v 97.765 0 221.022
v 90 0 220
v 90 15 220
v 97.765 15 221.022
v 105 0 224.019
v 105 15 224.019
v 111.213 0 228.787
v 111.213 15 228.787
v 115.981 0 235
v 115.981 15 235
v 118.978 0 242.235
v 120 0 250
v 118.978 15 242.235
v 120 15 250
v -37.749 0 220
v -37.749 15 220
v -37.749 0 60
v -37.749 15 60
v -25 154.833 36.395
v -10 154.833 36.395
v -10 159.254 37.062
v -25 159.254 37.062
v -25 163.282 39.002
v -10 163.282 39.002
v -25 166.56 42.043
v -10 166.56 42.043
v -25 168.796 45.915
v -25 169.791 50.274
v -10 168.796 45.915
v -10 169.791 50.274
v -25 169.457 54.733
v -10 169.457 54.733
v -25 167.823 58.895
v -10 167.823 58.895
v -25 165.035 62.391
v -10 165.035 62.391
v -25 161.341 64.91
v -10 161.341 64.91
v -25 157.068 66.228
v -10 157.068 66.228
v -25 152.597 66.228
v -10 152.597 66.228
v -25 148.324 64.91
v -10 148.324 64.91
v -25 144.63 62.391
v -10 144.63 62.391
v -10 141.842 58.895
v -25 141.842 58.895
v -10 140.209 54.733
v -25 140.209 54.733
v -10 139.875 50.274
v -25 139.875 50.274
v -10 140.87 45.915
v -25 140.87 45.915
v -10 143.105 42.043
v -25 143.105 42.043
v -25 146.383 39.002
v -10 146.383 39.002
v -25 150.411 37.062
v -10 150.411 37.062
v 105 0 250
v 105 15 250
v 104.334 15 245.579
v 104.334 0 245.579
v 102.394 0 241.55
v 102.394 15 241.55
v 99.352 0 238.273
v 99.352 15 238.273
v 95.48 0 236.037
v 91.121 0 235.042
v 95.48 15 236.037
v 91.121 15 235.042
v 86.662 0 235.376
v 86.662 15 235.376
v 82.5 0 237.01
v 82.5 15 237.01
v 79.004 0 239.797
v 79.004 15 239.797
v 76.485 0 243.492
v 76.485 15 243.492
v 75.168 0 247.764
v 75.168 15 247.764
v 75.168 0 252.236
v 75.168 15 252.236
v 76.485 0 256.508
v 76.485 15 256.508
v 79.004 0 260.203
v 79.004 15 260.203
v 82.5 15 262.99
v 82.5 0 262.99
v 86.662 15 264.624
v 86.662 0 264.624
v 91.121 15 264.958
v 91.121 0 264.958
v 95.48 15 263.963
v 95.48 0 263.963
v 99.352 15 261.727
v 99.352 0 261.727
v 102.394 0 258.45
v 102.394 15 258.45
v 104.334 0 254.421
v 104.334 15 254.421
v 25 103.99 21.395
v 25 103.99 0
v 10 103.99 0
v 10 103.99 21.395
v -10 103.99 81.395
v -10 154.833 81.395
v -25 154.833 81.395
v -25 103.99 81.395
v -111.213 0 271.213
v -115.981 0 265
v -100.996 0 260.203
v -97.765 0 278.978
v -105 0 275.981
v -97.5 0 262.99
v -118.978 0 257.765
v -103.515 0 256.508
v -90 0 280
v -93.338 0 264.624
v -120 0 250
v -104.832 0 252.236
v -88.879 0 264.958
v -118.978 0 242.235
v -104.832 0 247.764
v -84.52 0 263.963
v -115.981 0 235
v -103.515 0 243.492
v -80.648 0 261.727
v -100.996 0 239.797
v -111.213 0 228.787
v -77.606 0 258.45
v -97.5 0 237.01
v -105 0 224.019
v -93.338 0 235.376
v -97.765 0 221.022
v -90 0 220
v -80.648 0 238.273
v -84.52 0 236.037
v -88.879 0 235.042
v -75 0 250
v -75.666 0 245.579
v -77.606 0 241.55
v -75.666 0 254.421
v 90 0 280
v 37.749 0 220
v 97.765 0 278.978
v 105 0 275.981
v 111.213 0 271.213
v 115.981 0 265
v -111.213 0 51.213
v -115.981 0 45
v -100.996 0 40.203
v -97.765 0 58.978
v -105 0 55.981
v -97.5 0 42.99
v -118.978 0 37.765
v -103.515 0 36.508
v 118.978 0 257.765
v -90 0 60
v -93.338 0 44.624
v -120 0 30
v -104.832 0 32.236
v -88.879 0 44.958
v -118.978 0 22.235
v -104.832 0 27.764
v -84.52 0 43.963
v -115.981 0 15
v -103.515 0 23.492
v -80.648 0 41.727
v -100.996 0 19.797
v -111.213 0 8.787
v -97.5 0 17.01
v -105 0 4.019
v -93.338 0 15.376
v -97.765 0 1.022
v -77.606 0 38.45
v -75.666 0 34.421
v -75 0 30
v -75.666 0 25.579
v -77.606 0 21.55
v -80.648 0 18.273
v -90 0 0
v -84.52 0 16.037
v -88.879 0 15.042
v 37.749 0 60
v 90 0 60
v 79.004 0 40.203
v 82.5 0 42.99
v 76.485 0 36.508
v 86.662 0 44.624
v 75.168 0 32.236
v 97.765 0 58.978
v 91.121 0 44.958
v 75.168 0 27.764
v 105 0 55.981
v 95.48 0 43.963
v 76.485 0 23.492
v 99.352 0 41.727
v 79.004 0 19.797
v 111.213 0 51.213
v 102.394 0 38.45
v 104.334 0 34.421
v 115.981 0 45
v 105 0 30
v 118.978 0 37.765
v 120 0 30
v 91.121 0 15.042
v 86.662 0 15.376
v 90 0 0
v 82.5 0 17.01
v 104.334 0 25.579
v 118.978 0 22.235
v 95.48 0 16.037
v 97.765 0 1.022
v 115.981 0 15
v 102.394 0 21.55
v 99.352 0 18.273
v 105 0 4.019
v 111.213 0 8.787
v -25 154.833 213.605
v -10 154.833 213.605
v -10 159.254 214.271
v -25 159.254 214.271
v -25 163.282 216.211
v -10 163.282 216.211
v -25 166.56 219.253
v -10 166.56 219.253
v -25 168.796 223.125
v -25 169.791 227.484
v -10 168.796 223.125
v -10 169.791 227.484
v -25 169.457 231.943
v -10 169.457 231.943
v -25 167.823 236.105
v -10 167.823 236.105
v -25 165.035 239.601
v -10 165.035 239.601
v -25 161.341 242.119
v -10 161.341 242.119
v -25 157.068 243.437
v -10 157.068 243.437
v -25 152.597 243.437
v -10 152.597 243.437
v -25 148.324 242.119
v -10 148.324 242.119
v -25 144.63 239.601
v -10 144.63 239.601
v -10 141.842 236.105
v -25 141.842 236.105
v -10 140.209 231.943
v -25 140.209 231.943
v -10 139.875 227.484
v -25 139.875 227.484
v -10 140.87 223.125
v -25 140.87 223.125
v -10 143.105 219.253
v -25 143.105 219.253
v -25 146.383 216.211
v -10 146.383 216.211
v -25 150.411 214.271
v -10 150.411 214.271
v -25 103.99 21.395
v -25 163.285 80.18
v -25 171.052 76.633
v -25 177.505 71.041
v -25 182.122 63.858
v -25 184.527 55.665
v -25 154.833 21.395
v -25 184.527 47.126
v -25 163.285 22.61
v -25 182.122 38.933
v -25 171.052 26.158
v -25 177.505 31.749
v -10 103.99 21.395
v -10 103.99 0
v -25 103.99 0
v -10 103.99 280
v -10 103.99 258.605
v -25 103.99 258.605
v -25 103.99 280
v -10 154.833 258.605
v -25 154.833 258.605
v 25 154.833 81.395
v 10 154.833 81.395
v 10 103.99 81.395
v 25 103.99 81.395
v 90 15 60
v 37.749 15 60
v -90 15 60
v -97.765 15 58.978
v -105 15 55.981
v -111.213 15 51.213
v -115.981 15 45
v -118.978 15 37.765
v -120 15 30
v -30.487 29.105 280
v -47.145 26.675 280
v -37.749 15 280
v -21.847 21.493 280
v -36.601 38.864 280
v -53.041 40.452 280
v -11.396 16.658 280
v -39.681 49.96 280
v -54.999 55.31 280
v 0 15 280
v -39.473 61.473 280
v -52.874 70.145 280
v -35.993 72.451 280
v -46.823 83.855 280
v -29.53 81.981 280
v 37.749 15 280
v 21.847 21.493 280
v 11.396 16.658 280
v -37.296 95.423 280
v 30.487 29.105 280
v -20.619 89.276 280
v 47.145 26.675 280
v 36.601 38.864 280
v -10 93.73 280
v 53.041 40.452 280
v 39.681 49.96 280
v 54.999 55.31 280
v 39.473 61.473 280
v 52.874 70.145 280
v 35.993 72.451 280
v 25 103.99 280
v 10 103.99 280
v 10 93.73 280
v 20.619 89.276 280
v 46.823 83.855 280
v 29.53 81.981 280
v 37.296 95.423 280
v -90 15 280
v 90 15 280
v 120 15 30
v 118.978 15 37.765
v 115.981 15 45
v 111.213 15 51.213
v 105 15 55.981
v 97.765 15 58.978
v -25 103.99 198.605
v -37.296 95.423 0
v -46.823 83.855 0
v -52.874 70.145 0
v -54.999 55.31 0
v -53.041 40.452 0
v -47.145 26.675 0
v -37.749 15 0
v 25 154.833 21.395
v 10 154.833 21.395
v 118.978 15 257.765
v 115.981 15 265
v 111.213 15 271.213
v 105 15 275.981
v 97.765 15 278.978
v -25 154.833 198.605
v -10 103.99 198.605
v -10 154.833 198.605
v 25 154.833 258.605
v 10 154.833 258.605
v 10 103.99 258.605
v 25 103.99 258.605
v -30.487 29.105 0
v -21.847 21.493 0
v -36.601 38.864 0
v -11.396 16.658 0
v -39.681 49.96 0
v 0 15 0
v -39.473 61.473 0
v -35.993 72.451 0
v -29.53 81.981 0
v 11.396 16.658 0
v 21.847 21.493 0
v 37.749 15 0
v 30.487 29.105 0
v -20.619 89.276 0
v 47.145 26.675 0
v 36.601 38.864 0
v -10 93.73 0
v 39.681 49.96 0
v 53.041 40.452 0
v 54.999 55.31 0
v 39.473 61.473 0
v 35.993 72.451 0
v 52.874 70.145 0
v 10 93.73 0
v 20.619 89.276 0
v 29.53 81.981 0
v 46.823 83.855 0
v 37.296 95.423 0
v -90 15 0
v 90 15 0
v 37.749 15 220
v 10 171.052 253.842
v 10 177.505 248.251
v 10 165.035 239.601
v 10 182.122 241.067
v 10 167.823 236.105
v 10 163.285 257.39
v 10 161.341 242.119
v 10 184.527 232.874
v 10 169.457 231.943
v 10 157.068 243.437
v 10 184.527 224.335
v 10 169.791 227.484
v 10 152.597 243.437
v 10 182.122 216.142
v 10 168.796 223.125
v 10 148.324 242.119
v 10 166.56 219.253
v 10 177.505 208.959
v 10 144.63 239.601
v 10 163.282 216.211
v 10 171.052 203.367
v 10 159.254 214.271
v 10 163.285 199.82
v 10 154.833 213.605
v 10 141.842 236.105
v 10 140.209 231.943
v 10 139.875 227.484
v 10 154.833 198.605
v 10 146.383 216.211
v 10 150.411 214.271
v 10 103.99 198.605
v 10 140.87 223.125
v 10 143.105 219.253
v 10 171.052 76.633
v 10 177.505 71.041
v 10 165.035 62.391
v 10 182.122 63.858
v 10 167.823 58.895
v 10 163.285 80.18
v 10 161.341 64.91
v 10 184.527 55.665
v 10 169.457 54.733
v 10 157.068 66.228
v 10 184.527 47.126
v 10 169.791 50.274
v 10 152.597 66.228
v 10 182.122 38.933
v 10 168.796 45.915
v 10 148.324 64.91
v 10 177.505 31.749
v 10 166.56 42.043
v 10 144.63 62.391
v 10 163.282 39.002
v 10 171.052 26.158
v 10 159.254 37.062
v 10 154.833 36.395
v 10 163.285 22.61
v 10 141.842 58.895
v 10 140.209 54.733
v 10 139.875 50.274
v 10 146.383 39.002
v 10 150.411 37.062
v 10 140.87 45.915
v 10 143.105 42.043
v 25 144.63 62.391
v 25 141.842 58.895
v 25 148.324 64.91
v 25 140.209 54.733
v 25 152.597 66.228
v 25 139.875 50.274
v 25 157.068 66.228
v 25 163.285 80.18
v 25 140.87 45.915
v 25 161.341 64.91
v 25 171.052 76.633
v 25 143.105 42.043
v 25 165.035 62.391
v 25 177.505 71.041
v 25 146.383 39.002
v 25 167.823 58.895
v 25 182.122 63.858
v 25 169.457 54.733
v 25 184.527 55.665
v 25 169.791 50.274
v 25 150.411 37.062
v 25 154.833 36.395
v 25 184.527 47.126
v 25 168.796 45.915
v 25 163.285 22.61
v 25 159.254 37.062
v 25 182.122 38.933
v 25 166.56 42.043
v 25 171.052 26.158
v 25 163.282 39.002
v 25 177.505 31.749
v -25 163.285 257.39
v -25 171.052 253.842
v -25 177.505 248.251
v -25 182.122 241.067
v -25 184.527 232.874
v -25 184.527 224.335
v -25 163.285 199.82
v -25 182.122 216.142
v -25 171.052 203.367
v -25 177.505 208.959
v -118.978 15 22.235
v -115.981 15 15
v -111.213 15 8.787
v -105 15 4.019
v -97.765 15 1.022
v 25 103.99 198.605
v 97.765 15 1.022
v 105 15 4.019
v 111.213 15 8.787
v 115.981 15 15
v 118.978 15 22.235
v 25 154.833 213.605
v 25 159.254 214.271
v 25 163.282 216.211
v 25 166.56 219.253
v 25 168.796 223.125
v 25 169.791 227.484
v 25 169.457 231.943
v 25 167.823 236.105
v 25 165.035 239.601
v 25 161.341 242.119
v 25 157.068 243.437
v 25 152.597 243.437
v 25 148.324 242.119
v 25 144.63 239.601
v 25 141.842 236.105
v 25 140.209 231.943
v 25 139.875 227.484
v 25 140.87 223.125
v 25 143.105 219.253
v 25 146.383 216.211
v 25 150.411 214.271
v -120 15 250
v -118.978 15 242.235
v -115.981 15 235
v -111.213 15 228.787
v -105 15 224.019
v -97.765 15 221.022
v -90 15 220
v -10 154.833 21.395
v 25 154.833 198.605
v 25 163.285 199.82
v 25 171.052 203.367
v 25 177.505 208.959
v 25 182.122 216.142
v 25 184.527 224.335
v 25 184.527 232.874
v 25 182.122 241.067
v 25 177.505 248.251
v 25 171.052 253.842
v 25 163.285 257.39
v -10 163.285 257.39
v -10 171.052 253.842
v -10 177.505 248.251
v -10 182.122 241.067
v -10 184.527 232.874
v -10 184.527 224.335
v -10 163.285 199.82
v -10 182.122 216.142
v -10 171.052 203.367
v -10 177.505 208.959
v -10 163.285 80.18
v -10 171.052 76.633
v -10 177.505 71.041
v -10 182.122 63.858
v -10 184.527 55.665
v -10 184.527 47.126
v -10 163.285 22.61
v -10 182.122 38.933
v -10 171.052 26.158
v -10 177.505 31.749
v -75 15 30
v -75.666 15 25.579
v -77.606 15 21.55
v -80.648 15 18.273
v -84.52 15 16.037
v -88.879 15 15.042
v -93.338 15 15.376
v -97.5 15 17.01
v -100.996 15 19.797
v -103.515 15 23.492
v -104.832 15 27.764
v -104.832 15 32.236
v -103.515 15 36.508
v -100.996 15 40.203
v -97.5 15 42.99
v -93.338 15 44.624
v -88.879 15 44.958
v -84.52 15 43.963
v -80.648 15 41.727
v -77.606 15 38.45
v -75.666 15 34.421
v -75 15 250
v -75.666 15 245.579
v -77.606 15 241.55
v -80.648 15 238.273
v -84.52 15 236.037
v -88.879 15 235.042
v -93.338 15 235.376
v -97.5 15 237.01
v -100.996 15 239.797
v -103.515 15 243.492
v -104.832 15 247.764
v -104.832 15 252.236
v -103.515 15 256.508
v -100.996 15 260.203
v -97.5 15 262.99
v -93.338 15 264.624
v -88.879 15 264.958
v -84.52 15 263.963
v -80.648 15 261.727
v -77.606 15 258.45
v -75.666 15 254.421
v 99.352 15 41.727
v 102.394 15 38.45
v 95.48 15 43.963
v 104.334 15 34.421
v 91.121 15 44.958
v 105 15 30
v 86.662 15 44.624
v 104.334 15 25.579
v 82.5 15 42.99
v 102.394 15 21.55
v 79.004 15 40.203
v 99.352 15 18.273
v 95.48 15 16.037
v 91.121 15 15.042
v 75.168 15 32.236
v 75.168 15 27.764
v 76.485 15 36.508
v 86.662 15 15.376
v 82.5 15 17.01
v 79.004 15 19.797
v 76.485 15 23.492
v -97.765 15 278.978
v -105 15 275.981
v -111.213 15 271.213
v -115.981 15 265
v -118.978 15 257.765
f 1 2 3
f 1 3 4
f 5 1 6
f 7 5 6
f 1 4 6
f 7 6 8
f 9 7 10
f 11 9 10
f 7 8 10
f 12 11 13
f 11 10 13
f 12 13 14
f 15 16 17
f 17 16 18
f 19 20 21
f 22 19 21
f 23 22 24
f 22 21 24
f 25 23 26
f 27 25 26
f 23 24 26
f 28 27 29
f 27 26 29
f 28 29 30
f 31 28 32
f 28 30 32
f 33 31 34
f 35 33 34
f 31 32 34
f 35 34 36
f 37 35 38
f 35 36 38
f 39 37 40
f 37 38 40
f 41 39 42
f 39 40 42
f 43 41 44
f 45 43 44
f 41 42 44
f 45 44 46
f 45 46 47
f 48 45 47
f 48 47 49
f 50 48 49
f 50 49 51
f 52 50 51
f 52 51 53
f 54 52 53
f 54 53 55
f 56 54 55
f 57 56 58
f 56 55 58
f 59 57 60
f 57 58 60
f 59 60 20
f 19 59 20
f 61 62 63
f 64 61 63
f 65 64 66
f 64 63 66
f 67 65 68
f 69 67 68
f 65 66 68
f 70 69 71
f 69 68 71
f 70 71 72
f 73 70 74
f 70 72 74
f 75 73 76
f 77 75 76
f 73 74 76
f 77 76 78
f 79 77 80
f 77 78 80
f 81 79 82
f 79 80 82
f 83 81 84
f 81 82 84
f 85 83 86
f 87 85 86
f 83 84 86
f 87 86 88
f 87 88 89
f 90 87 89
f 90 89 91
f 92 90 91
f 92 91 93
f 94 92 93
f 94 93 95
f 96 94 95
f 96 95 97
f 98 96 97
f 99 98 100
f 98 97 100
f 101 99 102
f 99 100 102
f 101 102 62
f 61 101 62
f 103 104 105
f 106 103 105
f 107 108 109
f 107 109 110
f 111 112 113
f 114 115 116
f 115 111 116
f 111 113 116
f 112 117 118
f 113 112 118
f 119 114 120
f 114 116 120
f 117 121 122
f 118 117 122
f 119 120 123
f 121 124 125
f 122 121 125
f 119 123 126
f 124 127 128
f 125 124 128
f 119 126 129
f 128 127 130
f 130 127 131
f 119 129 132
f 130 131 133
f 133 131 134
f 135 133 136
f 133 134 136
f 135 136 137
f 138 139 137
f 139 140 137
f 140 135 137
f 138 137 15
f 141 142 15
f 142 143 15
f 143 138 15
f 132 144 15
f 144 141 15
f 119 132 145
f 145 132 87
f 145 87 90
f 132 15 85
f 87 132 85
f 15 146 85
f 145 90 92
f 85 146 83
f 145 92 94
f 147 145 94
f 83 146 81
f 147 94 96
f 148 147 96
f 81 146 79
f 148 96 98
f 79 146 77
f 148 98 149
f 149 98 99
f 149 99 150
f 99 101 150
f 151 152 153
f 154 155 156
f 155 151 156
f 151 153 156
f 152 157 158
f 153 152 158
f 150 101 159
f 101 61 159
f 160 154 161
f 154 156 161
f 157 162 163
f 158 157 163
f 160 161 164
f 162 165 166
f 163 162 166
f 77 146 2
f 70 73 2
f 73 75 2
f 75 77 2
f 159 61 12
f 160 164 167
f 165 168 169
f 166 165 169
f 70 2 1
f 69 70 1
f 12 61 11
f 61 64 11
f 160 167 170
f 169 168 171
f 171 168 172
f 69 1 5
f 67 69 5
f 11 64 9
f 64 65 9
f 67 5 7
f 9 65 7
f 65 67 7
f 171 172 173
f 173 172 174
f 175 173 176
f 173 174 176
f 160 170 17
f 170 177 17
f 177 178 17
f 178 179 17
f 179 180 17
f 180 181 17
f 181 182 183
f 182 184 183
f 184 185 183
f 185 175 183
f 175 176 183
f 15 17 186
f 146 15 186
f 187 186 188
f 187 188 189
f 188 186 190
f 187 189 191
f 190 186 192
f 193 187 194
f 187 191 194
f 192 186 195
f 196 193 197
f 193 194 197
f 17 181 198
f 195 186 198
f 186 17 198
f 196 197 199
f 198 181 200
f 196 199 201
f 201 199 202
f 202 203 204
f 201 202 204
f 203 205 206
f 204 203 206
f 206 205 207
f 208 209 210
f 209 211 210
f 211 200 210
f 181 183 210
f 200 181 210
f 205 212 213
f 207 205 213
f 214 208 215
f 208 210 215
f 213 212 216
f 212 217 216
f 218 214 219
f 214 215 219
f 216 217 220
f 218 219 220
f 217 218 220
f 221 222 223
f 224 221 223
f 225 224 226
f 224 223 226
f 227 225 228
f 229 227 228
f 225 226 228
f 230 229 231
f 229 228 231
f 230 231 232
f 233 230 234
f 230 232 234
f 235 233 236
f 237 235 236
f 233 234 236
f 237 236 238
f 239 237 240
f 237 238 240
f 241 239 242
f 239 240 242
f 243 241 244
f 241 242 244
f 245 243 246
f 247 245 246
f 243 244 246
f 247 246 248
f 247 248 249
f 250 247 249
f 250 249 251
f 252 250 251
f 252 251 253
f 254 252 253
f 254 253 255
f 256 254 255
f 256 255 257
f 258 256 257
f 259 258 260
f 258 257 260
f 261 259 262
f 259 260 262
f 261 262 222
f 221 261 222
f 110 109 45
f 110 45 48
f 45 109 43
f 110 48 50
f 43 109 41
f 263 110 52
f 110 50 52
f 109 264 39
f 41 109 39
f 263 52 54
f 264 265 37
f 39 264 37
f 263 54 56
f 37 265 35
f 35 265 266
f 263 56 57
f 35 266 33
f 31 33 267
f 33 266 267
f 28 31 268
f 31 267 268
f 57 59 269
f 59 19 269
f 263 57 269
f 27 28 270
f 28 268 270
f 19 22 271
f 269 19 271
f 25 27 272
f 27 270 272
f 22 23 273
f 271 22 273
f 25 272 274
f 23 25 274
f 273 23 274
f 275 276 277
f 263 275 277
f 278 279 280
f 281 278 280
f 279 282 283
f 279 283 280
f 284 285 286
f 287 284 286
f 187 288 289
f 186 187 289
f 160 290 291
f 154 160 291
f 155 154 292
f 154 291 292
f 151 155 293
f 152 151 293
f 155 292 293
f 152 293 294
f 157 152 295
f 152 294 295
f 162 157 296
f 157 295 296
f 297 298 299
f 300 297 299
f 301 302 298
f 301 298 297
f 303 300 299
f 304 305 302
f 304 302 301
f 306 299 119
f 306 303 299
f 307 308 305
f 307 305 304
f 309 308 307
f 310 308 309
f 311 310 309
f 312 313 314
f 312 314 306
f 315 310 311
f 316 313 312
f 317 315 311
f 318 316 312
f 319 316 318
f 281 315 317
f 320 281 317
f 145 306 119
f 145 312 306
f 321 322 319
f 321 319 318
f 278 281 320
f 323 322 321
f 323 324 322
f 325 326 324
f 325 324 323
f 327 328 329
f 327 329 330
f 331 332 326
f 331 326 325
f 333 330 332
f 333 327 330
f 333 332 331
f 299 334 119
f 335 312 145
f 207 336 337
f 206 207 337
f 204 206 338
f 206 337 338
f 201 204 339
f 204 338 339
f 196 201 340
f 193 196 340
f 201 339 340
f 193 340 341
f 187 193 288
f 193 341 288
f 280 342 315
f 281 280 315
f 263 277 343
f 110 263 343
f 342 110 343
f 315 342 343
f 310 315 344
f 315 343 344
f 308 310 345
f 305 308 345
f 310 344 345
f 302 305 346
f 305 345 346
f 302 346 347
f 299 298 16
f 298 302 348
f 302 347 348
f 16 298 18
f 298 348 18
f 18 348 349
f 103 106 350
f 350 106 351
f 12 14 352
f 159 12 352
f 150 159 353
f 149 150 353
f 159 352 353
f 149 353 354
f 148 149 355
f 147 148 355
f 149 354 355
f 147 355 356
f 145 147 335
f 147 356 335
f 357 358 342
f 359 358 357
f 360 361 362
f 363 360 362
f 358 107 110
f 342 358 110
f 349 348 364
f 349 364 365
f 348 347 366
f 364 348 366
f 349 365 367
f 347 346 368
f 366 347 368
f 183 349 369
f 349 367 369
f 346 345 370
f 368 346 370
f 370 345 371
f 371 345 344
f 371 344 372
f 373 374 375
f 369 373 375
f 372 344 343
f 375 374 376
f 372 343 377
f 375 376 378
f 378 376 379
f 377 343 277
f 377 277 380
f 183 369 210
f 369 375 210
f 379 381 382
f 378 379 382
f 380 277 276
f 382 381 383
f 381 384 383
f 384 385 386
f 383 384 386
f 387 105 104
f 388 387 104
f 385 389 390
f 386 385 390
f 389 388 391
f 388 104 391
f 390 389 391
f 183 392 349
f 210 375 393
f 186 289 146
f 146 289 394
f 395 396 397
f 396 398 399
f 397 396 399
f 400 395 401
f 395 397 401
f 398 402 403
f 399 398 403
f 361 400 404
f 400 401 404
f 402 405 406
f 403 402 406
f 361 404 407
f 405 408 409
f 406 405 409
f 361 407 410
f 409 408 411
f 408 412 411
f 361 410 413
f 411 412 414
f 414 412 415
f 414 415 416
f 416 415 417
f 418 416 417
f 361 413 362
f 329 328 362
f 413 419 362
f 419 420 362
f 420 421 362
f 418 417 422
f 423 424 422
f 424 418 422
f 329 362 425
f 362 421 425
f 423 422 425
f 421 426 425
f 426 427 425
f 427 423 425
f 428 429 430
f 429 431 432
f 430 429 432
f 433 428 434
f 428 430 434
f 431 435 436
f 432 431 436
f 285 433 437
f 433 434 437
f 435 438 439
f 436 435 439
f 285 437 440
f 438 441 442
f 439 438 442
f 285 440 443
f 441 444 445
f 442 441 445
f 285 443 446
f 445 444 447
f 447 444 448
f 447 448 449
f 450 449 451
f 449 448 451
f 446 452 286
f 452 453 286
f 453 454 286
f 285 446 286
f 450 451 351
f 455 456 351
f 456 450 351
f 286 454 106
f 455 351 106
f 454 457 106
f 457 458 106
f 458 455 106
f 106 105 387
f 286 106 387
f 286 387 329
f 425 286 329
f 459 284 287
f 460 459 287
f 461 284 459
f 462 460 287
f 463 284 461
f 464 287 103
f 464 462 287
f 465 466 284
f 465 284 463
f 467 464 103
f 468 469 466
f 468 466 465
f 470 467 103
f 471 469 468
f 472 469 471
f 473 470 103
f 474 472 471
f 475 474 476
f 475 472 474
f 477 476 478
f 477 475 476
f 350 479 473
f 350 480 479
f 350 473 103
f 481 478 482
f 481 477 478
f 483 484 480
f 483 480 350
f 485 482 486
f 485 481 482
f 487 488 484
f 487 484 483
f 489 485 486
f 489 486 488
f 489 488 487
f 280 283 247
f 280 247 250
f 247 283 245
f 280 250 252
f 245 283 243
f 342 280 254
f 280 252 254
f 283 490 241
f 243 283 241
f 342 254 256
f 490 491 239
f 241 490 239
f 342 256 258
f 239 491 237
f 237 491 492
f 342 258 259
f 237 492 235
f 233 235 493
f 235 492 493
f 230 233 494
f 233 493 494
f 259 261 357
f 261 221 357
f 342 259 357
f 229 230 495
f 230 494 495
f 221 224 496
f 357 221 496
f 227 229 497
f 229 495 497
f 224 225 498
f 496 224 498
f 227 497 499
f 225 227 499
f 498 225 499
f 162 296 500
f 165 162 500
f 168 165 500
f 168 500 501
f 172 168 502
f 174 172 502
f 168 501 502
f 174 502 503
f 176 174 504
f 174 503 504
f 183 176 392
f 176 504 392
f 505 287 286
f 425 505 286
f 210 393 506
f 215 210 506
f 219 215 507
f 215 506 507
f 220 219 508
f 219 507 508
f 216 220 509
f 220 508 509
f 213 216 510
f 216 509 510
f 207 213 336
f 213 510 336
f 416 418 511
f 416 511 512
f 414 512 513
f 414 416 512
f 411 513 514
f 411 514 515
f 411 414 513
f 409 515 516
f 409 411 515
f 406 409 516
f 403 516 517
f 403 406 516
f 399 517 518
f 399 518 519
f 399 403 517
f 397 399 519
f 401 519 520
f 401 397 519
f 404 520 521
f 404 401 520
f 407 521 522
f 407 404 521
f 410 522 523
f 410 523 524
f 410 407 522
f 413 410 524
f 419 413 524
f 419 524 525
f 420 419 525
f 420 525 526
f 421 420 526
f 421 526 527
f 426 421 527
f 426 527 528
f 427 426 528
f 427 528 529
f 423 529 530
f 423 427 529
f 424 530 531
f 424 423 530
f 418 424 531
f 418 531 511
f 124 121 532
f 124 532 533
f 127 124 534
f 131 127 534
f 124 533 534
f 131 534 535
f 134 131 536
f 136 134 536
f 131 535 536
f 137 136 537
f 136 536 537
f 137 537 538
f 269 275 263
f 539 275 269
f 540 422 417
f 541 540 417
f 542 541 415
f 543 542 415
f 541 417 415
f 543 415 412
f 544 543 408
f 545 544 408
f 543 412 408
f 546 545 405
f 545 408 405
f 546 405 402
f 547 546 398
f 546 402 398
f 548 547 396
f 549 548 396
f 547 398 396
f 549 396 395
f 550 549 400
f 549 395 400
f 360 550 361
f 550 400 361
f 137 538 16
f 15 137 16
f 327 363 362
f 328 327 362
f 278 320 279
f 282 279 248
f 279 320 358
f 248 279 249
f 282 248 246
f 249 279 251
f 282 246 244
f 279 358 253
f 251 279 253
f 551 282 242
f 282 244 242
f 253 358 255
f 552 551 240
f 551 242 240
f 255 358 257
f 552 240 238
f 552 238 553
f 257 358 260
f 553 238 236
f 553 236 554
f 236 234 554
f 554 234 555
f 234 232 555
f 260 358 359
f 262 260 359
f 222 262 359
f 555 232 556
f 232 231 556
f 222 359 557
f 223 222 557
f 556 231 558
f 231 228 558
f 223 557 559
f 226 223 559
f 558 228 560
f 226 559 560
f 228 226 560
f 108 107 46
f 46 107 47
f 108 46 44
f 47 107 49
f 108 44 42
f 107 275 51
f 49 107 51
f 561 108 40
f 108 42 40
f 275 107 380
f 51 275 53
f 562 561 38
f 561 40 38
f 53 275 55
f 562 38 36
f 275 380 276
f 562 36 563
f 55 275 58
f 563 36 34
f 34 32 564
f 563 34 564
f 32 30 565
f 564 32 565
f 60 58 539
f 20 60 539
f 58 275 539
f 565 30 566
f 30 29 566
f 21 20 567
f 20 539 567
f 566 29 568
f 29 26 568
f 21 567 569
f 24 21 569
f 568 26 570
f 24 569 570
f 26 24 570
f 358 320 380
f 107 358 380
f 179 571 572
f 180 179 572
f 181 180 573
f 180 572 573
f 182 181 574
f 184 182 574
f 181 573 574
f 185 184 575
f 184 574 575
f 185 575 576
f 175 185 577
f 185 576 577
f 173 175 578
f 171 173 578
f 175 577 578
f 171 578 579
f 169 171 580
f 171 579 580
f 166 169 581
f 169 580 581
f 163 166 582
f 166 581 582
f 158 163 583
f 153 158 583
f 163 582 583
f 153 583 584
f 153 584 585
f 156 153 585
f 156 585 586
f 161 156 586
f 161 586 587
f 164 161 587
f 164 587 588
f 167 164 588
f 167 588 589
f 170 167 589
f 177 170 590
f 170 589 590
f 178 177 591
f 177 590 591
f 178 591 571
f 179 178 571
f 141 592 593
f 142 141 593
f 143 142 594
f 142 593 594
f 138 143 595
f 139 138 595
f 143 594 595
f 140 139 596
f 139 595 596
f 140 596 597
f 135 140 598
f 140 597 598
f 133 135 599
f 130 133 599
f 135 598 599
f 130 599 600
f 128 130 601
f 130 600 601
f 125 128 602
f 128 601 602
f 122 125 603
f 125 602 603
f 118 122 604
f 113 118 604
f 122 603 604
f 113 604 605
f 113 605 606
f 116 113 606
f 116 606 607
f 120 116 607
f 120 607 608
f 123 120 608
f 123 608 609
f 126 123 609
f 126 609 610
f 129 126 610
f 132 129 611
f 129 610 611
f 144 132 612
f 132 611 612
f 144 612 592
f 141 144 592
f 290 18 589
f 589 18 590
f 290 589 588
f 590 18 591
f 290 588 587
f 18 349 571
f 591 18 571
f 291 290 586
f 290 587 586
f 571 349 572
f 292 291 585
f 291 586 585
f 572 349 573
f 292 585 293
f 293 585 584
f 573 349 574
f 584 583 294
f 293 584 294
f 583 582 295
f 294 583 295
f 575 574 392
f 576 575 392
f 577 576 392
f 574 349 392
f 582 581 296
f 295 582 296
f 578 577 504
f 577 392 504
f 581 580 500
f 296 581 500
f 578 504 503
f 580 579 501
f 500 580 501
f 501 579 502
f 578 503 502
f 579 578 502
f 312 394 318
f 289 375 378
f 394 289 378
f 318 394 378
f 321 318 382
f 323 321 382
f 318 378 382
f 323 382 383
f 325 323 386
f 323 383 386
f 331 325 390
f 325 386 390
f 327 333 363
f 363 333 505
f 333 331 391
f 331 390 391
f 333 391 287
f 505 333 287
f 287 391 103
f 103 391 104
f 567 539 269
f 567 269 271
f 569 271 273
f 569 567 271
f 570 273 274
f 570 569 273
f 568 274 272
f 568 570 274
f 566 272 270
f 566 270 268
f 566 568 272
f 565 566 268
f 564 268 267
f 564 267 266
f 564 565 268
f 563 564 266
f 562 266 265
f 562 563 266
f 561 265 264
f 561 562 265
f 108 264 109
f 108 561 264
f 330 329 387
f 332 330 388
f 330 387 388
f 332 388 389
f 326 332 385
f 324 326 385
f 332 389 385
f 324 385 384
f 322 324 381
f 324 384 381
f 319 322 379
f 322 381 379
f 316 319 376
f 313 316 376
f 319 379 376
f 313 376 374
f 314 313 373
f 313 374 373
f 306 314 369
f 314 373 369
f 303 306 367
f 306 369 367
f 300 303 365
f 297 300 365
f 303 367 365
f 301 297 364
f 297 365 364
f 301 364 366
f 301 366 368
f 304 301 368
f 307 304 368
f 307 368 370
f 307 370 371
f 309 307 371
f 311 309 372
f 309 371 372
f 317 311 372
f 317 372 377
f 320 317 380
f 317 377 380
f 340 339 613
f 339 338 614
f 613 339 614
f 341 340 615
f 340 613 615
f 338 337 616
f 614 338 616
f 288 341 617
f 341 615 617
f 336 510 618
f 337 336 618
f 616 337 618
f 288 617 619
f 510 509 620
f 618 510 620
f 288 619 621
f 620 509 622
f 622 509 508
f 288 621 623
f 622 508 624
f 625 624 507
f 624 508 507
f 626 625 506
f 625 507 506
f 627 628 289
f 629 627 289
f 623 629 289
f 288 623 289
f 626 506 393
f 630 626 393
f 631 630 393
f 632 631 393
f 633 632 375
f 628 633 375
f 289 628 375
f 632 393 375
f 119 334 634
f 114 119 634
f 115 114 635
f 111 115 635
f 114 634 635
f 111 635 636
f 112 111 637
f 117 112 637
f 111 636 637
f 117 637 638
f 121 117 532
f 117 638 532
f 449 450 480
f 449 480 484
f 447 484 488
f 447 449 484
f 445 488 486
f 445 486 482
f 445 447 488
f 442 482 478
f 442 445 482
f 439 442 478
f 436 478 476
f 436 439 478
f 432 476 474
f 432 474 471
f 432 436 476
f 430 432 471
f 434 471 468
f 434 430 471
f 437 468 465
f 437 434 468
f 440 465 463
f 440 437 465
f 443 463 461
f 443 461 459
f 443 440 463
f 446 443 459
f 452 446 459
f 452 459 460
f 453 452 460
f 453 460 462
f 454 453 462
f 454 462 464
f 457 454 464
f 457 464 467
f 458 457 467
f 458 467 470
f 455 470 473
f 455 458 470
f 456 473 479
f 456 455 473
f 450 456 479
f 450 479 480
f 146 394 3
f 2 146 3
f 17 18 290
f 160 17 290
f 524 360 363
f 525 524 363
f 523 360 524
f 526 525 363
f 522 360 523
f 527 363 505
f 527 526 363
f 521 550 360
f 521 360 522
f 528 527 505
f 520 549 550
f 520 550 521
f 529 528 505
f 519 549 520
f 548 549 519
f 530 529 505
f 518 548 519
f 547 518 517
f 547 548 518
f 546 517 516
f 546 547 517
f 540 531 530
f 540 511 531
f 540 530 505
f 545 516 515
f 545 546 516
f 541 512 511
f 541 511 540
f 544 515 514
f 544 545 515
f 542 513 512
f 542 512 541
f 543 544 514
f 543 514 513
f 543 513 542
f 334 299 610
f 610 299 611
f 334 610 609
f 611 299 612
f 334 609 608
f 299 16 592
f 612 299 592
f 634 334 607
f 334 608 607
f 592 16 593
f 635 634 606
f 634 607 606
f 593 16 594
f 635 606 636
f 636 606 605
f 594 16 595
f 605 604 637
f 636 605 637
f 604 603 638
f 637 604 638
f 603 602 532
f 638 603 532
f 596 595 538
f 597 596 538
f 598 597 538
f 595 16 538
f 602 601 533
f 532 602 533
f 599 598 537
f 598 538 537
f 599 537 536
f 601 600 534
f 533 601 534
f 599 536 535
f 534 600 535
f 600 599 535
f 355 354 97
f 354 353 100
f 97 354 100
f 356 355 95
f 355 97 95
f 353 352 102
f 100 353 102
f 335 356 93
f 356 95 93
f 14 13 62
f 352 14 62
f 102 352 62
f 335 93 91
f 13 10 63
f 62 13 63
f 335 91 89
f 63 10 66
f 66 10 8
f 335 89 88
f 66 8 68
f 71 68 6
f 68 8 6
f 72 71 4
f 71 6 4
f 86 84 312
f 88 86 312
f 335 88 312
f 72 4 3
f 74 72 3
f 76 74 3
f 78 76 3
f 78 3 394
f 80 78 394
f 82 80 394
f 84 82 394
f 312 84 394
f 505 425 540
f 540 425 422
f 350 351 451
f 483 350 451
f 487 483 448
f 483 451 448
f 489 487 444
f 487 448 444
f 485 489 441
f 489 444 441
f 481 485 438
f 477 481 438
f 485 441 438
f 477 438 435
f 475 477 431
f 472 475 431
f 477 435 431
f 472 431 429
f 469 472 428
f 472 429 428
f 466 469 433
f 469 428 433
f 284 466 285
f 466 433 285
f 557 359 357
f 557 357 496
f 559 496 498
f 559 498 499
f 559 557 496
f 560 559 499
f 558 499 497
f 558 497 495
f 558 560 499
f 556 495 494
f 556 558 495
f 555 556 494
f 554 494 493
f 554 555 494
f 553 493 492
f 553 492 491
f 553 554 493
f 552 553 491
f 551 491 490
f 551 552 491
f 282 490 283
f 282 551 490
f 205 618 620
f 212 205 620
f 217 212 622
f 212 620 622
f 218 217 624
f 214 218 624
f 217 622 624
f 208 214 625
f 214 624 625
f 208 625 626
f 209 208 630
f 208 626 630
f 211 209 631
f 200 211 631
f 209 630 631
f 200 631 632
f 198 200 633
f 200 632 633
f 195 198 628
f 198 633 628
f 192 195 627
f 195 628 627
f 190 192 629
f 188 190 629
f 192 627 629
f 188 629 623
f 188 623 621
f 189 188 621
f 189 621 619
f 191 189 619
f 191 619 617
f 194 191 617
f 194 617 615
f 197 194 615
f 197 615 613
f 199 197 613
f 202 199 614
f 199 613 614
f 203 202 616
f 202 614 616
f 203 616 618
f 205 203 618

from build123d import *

# Parameters (mm, degrees)
BOSS_EXTRUDE1_DEPTH       = 280
SKETCH4_R                 = 15
BOSS_EXTRUDE2_DEPTH       = 15
CUT_EXTRUDE1_DEPTH        = 15
CUT_EXTRUDE2_DEPTH        = 15
SKETCH9_R                 = 15
CUT_EXTRUDE3_DEPTH        = 15
LPATTERN1_COUNT           = 2
LPATTERN1_PITCH           = 180
LPATTERN2_COUNT           = 2
LPATTERN2_PITCH           = 220
LPATTERN2_COPY_1_SKETCH_R = 15
LPATTERN2_COPY_1_DEPTH    = 15


with BuildPart() as part:
    # Sketch1 → Boss-Extrude1 (new body)
    with BuildSketch(Plane.XY):
        with BuildLine():
            Line((-120, 0), (120, 0))
            Line((120, 0), (120, 15))
            Line((120, 15), (37.749172176, 15))
            ThreePointArc((37.749172176, 15), (54.444104817, 62.799964787), (25, 103.989794856))
            Line((25, 103.989794856), (10, 103.989794856))
            Line((10, 103.989794856), (10, 93.729833462))
            ThreePointArc((10, 93.729833462), (0, 15), (-10, 93.729833462))
            Line((-10, 93.729833462), (-10, 103.989794856))
            Line((-10, 103.989794856), (-25, 103.989794856))
            ThreePointArc((-25, 103.989794856), (-54.444104817, 62.799964787), (-37.749172176, 15))
            Line((-37.749172176, 15), (-120, 15))
            Line((-120, 15), (-120, 0))
        make_face()
    extrude(amount=BOSS_EXTRUDE1_DEPTH)

    # Sketch4 → Boss-Extrude2 (add)
    with BuildSketch(Plane(origin=(-10, 0, 0), x_dir=(0, 0, -1), z_dir=(1, 0, 0))):
        with BuildLine():
            Line((-258.604852185, 154.832655732), (-258.604852185, 103.989794856))
            Line((-258.604852185, 103.989794856), (-198.604852185, 103.989794856))
            Line((-198.604852185, 103.989794856), (-198.604852185, 154.832655732))
            ThreePointArc((-198.604852185, 154.832655732), (-228.604852185, 184.832655732), (-258.604852185, 154.832655732))
        make_face()
        with Locations((-228.604852185, 154.832655732)):
            Circle(SKETCH4_R, mode=Mode.SUBTRACT)
        with BuildLine():
            Line((-81.395147815, 103.989794856), (-21.395147815, 103.989794856))
            Line((-21.395147815, 103.989794856), (-21.395147815, 154.832655732))
            ThreePointArc((-21.395147815, 154.832655732), (-51.395147815, 184.832655732), (-81.395147815, 154.832655732))
            Line((-81.395147815, 154.832655732), (-81.395147815, 103.989794856))
        make_face()
        with Locations((-51.395147815, 154.832655732)):
            Circle(SKETCH4_R, mode=Mode.SUBTRACT)
    boss_extrude2 = extrude(amount=-BOSS_EXTRUDE2_DEPTH)

    # Mirror1: Boss-Extrude2 across plane
    add(boss_extrude2.mirror(Plane(origin=(0, 0, 0), x_dir=(0, 0, 1), z_dir=(1, 0, 0))))

    # Sketch5 → Cut-Extrude1 (cut)
    with BuildSketch(Plane(origin=(0, 15, 0), x_dir=(1, 0, 0), z_dir=(0, 1, 0))):
        with BuildLine():
            Line((120, -250), (120, -30.000000185))
            ThreePointArc((120, -30.000000185), (111.21320337, -51.213203501), (90, -60))
            Line((90, -60), (37.749172176, -60))
            Line((37.749172176, -60), (37.749172176, -220))
            Line((37.749172176, -220), (90, -220))
            ThreePointArc((90, -220), (111.213203436, -228.786796564), (120, -250))
        make_face()
        with BuildLine():
            Line((120, 0), (90, 0))
            ThreePointArc((90, 0), (111.213203501, -8.78679663), (120, -30.000000185))
            Line((120, -30.000000185), (120, 0))
        make_face()
        with BuildLine():
            Line((120, -280), (120, -250))
            ThreePointArc((120, -250), (111.213203436, -271.213203436), (90, -280))
            Line((90, -280), (120, -280))
        make_face()
    extrude(amount=-CUT_EXTRUDE1_DEPTH, mode=Mode.SUBTRACT)

    # Sketch7 → Cut-Extrude2 (cut)
    with BuildSketch(Plane(origin=(0, 15, 0), x_dir=(1, 0, 0), z_dir=(0, 1, 0))):
        with BuildLine():
            Line((-37.749172176, -220), (-37.749172176, -60))
            Line((-37.749172176, -60), (-90, -60))
            ThreePointArc((-90, -60), (-111.213203468, -51.213203403), (-120, -29.999999908))
            Line((-120, -29.999999908), (-120, -250))
            ThreePointArc((-120, -250), (-111.213203436, -228.786796564), (-90, -220))
            Line((-90, -220), (-37.749172176, -220))
        make_face()
        with BuildLine():
            ThreePointArc((-120, -29.999999908), (-111.213203403, -8.786796532), (-90, 0))
            Line((-90, 0), (-120, 0))
            Line((-120, 0), (-120, -29.999999908))
        make_face()
        with BuildLine():
            ThreePointArc((-90, -280), (-111.213203436, -271.213203436), (-120, -250))
            Line((-120, -250), (-120, -280))
            Line((-120, -280), (-90, -280))
        make_face()
    extrude(amount=-CUT_EXTRUDE2_DEPTH, mode=Mode.SUBTRACT)

    # Sketch9 → Cut-Extrude3 (cut)
    with BuildSketch(Plane(origin=(0, 15, 0), x_dir=(1, 0, 0), z_dir=(0, 1, 0))):
        with Locations((90, -30)):
            Circle(SKETCH9_R)
    cut_extrude3 = extrude(amount=-CUT_EXTRUDE3_DEPTH, mode=Mode.SUBTRACT)

    # LPattern1: Cut-Extrude3 ×2
    with Locations(*[(-i * LPATTERN1_PITCH, 0, 0) for i in range(1, LPATTERN1_COUNT)]):
        add(cut_extrude3, mode=Mode.SUBTRACT)

    # LPattern2: Cut-Extrude3 ×2
    with Locations(*[(0, 0, i * LPATTERN2_PITCH) for i in range(1, LPATTERN2_COUNT)]):
        add(cut_extrude3, mode=Mode.SUBTRACT)

    # LPattern2 copy 1 sketch → LPattern2 copy 1 (cut)
    with BuildSketch(Plane(origin=(-180, 15, 220), x_dir=(1, 0, 0), z_dir=(0, 1, 0))):
        with Locations((90, -30)):
            Circle(LPATTERN2_COPY_1_SKETCH_R)
    extrude(amount=-LPATTERN2_COPY_1_DEPTH, mode=Mode.SUBTRACT)


solid = part.part
